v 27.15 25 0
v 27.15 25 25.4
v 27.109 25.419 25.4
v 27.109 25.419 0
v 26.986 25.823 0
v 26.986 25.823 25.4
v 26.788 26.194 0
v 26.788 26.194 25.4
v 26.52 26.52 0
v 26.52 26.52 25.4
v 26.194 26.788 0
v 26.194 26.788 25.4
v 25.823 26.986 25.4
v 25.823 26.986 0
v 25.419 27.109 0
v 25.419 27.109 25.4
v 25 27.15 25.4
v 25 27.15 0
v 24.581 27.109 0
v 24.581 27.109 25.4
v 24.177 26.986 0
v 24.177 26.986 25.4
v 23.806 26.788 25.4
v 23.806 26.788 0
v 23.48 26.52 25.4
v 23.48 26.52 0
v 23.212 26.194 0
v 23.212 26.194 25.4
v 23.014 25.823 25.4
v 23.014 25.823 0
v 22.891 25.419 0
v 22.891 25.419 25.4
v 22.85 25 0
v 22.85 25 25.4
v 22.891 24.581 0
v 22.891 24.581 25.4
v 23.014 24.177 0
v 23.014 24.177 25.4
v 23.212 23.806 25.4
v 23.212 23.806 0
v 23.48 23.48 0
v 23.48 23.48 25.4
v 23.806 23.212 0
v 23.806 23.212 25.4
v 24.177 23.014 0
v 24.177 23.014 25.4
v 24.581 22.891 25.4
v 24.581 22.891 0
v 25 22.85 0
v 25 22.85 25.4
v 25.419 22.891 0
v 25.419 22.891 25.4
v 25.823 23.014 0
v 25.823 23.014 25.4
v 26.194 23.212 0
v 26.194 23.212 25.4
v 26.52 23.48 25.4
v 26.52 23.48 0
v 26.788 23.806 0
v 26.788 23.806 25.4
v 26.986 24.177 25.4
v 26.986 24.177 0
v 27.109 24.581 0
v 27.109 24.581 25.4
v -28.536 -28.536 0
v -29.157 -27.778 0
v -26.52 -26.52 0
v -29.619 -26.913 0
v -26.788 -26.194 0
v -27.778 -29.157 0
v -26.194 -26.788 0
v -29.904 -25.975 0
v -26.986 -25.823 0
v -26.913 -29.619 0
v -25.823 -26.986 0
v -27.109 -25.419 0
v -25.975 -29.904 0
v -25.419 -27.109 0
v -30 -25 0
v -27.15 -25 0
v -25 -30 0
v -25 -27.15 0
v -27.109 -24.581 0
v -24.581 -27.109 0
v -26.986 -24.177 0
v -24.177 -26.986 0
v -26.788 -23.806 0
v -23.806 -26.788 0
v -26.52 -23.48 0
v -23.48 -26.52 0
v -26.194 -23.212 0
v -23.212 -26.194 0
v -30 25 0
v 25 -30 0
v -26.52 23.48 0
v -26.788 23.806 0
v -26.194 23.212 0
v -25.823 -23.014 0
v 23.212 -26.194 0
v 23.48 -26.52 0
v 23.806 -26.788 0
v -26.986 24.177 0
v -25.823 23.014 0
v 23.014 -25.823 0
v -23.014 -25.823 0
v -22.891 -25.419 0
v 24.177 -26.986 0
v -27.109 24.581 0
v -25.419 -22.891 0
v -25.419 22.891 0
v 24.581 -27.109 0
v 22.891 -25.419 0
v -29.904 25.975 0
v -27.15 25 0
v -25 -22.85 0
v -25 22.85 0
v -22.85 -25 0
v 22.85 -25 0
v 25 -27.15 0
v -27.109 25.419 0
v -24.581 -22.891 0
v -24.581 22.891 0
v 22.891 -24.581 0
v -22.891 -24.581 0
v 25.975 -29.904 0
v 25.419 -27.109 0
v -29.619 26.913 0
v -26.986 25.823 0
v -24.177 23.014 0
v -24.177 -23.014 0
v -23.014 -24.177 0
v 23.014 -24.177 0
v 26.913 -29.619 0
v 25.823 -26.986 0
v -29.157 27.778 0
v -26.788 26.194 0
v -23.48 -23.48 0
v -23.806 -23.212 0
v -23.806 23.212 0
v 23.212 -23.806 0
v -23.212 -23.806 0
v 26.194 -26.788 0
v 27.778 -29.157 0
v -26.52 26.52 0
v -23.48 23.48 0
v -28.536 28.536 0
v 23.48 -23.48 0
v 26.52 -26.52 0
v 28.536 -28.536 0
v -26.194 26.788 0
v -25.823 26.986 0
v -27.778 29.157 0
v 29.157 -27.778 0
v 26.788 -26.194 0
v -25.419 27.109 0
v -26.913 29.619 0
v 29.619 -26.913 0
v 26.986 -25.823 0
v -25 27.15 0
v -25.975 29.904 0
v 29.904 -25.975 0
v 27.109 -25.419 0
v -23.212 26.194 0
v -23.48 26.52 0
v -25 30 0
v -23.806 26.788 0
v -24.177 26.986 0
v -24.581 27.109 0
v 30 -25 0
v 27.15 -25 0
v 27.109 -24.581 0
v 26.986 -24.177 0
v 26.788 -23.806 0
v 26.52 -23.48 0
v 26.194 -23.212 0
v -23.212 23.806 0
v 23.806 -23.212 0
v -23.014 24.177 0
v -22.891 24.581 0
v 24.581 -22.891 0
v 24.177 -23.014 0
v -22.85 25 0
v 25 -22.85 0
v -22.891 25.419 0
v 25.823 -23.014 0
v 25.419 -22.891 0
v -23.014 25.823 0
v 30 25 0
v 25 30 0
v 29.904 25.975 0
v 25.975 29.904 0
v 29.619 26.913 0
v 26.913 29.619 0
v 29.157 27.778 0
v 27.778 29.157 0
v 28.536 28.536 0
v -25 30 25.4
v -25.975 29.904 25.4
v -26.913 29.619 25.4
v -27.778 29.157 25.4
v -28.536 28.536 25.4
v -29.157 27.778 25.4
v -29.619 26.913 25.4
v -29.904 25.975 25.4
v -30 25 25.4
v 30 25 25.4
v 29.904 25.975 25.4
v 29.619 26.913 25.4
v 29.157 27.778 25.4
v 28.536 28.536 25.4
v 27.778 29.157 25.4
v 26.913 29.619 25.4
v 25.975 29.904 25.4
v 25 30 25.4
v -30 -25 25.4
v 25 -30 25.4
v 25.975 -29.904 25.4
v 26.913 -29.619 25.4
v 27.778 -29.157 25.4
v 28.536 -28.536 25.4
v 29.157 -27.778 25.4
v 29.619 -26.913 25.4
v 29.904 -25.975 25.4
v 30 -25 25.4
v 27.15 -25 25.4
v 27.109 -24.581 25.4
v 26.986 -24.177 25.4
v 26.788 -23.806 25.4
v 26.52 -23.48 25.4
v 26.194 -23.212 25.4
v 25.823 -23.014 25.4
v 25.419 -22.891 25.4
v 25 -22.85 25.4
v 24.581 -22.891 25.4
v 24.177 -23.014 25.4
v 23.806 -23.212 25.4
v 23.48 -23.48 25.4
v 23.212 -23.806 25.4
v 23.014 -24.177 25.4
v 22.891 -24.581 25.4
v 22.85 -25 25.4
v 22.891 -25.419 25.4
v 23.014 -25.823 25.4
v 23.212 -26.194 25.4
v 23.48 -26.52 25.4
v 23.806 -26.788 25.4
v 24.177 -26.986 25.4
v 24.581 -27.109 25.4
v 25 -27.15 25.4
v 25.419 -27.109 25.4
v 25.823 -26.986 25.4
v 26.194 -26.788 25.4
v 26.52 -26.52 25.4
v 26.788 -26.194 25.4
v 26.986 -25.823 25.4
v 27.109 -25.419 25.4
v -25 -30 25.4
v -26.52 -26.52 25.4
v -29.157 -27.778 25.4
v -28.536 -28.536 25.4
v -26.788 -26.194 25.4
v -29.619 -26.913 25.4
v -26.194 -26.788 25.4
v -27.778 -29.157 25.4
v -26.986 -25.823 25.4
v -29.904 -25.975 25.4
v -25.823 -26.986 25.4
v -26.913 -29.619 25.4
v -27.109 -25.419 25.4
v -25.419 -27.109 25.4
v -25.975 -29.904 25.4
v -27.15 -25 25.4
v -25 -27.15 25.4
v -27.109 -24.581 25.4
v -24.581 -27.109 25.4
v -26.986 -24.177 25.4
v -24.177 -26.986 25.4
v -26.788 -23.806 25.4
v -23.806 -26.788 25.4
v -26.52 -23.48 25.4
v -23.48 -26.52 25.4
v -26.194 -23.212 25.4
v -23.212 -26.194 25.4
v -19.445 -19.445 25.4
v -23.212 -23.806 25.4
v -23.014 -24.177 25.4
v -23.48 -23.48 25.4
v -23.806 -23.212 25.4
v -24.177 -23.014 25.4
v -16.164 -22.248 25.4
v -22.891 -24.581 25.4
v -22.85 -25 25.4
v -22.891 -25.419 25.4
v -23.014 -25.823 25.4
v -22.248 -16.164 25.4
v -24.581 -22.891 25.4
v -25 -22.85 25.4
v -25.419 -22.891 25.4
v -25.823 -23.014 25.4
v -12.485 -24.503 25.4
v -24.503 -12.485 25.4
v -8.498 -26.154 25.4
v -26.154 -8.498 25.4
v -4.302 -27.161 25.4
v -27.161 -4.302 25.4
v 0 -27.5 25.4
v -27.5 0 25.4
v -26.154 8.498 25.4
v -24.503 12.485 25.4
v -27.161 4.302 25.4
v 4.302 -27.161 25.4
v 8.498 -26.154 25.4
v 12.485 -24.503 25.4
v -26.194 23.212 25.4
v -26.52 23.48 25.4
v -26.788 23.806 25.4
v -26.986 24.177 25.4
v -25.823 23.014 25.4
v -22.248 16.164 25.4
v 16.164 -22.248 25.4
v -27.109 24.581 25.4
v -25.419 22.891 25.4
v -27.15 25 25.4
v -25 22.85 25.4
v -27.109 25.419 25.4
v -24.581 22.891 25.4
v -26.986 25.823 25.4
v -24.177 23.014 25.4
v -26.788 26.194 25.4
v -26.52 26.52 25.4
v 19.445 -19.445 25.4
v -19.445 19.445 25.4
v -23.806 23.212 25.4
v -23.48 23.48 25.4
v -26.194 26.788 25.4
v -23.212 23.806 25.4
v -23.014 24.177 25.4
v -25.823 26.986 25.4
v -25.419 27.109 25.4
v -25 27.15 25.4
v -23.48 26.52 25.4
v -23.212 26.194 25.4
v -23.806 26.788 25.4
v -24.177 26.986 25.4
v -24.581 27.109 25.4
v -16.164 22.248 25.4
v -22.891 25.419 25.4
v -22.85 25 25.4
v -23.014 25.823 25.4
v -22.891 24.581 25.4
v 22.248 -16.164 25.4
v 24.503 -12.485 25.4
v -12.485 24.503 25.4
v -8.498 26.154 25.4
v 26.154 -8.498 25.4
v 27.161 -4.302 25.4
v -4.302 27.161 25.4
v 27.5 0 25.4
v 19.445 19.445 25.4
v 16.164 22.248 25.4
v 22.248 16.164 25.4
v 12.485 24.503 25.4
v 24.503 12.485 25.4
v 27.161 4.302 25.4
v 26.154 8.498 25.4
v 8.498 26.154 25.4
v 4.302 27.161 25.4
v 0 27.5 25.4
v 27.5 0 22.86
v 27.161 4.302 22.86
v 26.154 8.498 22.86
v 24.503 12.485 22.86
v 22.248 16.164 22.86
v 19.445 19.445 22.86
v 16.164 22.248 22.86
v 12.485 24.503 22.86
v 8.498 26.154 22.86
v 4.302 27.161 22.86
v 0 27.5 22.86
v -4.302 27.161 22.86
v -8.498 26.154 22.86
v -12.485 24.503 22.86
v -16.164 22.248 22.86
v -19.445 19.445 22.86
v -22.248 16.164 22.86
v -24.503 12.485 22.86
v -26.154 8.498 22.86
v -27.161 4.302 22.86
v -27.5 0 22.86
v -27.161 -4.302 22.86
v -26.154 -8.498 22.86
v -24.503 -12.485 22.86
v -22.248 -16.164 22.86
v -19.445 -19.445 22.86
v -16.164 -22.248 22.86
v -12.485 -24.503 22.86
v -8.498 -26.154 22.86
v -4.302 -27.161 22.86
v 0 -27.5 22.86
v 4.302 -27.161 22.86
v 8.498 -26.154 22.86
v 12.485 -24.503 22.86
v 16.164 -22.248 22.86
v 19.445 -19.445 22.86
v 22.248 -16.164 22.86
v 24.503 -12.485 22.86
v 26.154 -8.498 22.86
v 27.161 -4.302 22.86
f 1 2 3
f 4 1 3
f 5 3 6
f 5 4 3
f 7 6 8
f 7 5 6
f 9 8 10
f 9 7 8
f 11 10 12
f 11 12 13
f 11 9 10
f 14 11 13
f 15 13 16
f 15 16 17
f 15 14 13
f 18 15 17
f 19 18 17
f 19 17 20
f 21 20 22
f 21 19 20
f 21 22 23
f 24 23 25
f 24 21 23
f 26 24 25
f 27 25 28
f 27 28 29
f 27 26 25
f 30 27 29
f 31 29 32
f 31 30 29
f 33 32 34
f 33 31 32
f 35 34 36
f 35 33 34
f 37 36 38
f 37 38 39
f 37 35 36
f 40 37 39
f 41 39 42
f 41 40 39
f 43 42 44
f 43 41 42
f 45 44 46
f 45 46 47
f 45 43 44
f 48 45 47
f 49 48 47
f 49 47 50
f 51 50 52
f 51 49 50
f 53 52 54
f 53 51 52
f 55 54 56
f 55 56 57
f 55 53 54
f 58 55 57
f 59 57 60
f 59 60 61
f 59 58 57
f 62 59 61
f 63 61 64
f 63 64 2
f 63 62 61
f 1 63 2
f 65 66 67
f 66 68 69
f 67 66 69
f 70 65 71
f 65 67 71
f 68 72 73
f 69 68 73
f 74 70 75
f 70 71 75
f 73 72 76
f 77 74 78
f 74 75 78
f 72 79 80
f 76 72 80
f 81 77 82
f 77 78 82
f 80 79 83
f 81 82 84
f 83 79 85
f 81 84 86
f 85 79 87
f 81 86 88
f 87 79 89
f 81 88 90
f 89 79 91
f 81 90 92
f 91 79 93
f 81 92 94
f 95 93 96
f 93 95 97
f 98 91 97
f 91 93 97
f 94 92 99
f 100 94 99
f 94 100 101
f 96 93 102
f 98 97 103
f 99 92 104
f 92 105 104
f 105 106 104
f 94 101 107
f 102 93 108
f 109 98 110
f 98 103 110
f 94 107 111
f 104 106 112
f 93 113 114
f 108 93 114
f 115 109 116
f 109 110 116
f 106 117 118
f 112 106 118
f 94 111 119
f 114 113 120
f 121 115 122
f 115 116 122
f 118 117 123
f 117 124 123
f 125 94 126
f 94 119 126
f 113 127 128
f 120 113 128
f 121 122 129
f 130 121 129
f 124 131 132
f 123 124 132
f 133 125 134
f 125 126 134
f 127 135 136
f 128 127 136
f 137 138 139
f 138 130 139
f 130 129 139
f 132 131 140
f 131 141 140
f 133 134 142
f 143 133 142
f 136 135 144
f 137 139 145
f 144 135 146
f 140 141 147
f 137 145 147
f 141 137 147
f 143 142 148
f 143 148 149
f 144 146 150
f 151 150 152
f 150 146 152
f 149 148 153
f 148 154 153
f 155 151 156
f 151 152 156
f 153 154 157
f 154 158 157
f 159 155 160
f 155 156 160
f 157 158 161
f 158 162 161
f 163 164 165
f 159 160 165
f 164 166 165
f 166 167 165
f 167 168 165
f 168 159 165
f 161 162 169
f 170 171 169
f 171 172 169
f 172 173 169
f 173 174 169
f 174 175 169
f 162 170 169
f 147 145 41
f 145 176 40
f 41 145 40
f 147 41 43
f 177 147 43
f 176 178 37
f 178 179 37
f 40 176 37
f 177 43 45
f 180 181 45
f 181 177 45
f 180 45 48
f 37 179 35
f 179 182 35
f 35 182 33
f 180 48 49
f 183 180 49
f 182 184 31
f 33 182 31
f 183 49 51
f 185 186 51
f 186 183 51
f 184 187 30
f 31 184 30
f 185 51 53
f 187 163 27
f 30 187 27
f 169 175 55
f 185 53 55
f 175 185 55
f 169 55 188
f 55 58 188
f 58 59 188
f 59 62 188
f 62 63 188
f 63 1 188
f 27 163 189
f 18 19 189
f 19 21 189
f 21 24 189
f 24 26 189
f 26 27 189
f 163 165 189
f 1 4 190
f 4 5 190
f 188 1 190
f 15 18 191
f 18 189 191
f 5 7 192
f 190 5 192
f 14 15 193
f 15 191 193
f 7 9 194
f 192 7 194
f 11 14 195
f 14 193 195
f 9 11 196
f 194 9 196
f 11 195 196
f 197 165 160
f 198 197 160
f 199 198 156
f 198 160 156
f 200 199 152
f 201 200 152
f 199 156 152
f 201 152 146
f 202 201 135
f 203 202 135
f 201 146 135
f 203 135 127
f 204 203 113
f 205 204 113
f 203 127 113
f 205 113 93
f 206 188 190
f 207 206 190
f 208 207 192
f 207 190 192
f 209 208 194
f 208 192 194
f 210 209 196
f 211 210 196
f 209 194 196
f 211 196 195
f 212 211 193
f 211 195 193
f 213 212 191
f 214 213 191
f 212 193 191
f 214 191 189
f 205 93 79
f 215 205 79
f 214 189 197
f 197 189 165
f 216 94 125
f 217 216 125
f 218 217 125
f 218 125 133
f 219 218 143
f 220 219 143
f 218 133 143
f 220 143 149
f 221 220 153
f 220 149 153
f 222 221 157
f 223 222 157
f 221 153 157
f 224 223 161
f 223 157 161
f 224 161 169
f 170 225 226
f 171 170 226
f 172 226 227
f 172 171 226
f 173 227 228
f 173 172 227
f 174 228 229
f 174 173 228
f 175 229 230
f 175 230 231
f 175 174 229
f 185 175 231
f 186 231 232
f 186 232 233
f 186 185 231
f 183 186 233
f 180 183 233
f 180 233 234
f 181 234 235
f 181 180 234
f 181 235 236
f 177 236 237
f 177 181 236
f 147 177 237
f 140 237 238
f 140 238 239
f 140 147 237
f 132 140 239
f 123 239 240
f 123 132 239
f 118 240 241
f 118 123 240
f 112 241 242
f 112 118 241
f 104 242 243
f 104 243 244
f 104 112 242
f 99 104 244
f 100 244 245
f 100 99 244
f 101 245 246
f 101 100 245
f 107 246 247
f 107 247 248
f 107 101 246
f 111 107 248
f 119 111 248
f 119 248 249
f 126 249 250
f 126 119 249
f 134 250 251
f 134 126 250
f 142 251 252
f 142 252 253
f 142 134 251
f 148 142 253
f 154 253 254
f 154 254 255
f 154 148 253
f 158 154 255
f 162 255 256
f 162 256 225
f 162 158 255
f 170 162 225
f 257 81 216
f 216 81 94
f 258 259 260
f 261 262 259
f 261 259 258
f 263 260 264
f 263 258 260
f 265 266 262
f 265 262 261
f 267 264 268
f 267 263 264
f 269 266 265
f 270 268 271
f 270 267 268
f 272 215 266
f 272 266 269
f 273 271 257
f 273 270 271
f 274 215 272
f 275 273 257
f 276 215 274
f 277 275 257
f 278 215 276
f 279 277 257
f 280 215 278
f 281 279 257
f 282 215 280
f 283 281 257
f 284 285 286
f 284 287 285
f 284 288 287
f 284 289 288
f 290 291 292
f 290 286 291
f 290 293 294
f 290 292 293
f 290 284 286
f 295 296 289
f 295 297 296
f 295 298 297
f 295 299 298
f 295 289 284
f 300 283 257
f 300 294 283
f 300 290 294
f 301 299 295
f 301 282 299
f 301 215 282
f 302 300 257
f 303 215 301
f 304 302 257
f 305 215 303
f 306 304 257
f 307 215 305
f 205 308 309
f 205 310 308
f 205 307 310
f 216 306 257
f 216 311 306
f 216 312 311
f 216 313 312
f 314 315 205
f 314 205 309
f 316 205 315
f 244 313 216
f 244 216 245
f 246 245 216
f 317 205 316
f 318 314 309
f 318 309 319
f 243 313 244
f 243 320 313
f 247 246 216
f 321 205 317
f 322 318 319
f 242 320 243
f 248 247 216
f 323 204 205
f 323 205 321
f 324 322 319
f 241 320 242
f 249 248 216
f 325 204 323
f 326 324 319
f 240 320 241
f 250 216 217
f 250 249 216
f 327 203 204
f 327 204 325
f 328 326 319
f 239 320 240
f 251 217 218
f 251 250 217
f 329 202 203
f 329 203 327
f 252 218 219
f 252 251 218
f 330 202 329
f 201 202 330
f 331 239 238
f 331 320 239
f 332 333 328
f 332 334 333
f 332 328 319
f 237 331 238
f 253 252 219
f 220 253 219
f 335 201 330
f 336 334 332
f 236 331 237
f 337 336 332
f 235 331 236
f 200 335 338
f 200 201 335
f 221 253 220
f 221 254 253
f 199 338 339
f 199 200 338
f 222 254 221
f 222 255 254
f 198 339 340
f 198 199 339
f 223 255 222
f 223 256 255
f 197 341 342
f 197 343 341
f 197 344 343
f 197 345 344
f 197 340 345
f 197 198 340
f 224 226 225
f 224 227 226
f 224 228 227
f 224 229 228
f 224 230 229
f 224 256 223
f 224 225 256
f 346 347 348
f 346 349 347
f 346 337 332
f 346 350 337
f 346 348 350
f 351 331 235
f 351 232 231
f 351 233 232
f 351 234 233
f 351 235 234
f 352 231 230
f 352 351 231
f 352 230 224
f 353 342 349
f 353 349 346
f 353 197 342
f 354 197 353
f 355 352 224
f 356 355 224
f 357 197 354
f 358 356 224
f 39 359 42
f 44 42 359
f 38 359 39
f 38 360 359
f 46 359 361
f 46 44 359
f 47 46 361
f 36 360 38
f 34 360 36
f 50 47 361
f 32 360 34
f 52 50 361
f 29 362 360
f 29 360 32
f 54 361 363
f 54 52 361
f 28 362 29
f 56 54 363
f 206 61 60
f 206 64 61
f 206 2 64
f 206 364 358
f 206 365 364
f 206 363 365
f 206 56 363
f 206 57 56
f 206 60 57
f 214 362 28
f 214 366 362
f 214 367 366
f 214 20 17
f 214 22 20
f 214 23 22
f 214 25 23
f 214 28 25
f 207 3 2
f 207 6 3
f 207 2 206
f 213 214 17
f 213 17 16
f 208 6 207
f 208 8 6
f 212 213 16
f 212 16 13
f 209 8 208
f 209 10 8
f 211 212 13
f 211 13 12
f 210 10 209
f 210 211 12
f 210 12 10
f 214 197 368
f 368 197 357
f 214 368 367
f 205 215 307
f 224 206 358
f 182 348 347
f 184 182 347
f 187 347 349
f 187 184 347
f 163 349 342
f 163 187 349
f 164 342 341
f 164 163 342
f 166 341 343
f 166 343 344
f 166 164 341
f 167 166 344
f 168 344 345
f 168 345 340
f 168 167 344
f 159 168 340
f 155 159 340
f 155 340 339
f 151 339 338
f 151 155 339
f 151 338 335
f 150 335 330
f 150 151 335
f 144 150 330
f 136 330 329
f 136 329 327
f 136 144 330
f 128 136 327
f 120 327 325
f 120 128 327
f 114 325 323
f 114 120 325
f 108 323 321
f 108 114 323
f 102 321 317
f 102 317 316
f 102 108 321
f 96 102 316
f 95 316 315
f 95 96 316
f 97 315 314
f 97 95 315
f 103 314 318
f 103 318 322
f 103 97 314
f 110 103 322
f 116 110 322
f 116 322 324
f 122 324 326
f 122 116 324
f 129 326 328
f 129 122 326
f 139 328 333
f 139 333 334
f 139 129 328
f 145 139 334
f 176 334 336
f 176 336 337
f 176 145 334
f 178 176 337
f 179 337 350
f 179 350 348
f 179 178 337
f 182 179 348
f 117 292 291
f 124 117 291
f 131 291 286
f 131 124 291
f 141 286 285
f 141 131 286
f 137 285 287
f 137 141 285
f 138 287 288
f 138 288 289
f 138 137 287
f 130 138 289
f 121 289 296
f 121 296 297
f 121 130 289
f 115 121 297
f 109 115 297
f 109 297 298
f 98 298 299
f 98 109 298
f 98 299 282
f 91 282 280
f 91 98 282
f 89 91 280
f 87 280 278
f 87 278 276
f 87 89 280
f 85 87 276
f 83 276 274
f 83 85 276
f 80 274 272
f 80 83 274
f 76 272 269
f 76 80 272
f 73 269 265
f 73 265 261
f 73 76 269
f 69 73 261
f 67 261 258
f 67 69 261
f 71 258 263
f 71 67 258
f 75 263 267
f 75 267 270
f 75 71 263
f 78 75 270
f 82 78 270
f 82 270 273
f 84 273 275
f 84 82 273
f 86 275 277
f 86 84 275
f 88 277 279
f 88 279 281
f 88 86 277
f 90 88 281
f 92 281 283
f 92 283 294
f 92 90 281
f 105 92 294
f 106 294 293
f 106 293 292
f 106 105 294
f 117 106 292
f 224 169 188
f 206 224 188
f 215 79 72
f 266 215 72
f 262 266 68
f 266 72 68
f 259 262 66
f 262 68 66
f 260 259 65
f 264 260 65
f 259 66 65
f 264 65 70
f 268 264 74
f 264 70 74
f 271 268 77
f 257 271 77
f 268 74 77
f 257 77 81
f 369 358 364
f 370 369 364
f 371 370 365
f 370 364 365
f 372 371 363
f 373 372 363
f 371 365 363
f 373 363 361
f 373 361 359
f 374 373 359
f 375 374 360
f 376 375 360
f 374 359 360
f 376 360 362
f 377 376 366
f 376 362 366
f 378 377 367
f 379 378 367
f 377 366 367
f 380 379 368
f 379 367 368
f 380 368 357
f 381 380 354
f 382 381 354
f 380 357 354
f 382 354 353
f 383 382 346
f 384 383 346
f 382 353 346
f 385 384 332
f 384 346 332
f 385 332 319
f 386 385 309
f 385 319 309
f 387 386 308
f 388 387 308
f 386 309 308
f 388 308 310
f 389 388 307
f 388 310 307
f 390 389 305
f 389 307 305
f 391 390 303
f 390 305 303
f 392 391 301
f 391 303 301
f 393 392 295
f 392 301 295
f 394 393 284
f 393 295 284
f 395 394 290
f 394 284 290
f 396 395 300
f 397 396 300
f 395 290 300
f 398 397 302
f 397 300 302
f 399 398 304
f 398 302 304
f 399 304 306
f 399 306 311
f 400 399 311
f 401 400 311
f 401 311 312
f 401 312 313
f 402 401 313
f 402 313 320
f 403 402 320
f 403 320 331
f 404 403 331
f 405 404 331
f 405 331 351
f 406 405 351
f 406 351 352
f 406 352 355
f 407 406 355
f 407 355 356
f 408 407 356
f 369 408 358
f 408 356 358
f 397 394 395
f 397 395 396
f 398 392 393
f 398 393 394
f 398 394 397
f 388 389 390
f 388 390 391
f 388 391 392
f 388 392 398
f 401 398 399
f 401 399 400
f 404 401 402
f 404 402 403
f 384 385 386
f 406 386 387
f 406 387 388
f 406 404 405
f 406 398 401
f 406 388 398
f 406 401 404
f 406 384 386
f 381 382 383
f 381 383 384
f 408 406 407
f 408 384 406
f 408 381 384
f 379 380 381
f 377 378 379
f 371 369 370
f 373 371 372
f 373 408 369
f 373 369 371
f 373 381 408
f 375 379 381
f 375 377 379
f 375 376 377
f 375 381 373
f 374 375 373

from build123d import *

# Parameters (mm, degrees)
SKETCH1_R           = 2.15
BOSS_EXTRUDE1_DEPTH = 25.4
SKETCH2_R           = 27.5
CUT_EXTRUDE1_DEPTH  = 2.54


with BuildPart() as part:
    # Sketch1 → Boss-Extrude1 (new body)
    with BuildSketch(Plane.XY):
        with BuildLine():
            Line((25.000000038, 30), (-25.000000038, 30))
            ThreePointArc((-25.000000038, 30), (-28.535533911, 28.535533885), (-30, 25))
            Line((-30, 25), (-30, -25))
            ThreePointArc((-30, -25), (-28.535533911, -28.535533885), (-25.000000038, -30))
            Line((-25.000000038, -30), (25.000000038, -30))
            ThreePointArc((25.000000038, -30), (28.535533944, -28.535533906), (30.000000038, -25))
            Line((30, -25), (30, 25))
            ThreePointArc((30, 25), (28.535533911, 28.535533885), (25.000000038, 30))
        make_face()
        with Locations((-25.000000038, -25)):
            Circle(SKETCH1_R, mode=Mode.SUBTRACT)
        with Locations((25.000000038, -25)):
            Circle(SKETCH1_R, mode=Mode.SUBTRACT)
        with Locations((-25.000000038, 25)):
            Circle(SKETCH1_R, mode=Mode.SUBTRACT)
        with Locations((25.000000038, 25)):
            Circle(SKETCH1_R, mode=Mode.SUBTRACT)
    extrude(amount=BOSS_EXTRUDE1_DEPTH)

    # Sketch2 → Cut-Extrude1 (cut)
    with BuildSketch(Plane.XY.offset(25.4)):
        Circle(SKETCH2_R)
    extrude(amount=-CUT_EXTRUDE1_DEPTH, mode=Mode.SUBTRACT)


solid = part.part
